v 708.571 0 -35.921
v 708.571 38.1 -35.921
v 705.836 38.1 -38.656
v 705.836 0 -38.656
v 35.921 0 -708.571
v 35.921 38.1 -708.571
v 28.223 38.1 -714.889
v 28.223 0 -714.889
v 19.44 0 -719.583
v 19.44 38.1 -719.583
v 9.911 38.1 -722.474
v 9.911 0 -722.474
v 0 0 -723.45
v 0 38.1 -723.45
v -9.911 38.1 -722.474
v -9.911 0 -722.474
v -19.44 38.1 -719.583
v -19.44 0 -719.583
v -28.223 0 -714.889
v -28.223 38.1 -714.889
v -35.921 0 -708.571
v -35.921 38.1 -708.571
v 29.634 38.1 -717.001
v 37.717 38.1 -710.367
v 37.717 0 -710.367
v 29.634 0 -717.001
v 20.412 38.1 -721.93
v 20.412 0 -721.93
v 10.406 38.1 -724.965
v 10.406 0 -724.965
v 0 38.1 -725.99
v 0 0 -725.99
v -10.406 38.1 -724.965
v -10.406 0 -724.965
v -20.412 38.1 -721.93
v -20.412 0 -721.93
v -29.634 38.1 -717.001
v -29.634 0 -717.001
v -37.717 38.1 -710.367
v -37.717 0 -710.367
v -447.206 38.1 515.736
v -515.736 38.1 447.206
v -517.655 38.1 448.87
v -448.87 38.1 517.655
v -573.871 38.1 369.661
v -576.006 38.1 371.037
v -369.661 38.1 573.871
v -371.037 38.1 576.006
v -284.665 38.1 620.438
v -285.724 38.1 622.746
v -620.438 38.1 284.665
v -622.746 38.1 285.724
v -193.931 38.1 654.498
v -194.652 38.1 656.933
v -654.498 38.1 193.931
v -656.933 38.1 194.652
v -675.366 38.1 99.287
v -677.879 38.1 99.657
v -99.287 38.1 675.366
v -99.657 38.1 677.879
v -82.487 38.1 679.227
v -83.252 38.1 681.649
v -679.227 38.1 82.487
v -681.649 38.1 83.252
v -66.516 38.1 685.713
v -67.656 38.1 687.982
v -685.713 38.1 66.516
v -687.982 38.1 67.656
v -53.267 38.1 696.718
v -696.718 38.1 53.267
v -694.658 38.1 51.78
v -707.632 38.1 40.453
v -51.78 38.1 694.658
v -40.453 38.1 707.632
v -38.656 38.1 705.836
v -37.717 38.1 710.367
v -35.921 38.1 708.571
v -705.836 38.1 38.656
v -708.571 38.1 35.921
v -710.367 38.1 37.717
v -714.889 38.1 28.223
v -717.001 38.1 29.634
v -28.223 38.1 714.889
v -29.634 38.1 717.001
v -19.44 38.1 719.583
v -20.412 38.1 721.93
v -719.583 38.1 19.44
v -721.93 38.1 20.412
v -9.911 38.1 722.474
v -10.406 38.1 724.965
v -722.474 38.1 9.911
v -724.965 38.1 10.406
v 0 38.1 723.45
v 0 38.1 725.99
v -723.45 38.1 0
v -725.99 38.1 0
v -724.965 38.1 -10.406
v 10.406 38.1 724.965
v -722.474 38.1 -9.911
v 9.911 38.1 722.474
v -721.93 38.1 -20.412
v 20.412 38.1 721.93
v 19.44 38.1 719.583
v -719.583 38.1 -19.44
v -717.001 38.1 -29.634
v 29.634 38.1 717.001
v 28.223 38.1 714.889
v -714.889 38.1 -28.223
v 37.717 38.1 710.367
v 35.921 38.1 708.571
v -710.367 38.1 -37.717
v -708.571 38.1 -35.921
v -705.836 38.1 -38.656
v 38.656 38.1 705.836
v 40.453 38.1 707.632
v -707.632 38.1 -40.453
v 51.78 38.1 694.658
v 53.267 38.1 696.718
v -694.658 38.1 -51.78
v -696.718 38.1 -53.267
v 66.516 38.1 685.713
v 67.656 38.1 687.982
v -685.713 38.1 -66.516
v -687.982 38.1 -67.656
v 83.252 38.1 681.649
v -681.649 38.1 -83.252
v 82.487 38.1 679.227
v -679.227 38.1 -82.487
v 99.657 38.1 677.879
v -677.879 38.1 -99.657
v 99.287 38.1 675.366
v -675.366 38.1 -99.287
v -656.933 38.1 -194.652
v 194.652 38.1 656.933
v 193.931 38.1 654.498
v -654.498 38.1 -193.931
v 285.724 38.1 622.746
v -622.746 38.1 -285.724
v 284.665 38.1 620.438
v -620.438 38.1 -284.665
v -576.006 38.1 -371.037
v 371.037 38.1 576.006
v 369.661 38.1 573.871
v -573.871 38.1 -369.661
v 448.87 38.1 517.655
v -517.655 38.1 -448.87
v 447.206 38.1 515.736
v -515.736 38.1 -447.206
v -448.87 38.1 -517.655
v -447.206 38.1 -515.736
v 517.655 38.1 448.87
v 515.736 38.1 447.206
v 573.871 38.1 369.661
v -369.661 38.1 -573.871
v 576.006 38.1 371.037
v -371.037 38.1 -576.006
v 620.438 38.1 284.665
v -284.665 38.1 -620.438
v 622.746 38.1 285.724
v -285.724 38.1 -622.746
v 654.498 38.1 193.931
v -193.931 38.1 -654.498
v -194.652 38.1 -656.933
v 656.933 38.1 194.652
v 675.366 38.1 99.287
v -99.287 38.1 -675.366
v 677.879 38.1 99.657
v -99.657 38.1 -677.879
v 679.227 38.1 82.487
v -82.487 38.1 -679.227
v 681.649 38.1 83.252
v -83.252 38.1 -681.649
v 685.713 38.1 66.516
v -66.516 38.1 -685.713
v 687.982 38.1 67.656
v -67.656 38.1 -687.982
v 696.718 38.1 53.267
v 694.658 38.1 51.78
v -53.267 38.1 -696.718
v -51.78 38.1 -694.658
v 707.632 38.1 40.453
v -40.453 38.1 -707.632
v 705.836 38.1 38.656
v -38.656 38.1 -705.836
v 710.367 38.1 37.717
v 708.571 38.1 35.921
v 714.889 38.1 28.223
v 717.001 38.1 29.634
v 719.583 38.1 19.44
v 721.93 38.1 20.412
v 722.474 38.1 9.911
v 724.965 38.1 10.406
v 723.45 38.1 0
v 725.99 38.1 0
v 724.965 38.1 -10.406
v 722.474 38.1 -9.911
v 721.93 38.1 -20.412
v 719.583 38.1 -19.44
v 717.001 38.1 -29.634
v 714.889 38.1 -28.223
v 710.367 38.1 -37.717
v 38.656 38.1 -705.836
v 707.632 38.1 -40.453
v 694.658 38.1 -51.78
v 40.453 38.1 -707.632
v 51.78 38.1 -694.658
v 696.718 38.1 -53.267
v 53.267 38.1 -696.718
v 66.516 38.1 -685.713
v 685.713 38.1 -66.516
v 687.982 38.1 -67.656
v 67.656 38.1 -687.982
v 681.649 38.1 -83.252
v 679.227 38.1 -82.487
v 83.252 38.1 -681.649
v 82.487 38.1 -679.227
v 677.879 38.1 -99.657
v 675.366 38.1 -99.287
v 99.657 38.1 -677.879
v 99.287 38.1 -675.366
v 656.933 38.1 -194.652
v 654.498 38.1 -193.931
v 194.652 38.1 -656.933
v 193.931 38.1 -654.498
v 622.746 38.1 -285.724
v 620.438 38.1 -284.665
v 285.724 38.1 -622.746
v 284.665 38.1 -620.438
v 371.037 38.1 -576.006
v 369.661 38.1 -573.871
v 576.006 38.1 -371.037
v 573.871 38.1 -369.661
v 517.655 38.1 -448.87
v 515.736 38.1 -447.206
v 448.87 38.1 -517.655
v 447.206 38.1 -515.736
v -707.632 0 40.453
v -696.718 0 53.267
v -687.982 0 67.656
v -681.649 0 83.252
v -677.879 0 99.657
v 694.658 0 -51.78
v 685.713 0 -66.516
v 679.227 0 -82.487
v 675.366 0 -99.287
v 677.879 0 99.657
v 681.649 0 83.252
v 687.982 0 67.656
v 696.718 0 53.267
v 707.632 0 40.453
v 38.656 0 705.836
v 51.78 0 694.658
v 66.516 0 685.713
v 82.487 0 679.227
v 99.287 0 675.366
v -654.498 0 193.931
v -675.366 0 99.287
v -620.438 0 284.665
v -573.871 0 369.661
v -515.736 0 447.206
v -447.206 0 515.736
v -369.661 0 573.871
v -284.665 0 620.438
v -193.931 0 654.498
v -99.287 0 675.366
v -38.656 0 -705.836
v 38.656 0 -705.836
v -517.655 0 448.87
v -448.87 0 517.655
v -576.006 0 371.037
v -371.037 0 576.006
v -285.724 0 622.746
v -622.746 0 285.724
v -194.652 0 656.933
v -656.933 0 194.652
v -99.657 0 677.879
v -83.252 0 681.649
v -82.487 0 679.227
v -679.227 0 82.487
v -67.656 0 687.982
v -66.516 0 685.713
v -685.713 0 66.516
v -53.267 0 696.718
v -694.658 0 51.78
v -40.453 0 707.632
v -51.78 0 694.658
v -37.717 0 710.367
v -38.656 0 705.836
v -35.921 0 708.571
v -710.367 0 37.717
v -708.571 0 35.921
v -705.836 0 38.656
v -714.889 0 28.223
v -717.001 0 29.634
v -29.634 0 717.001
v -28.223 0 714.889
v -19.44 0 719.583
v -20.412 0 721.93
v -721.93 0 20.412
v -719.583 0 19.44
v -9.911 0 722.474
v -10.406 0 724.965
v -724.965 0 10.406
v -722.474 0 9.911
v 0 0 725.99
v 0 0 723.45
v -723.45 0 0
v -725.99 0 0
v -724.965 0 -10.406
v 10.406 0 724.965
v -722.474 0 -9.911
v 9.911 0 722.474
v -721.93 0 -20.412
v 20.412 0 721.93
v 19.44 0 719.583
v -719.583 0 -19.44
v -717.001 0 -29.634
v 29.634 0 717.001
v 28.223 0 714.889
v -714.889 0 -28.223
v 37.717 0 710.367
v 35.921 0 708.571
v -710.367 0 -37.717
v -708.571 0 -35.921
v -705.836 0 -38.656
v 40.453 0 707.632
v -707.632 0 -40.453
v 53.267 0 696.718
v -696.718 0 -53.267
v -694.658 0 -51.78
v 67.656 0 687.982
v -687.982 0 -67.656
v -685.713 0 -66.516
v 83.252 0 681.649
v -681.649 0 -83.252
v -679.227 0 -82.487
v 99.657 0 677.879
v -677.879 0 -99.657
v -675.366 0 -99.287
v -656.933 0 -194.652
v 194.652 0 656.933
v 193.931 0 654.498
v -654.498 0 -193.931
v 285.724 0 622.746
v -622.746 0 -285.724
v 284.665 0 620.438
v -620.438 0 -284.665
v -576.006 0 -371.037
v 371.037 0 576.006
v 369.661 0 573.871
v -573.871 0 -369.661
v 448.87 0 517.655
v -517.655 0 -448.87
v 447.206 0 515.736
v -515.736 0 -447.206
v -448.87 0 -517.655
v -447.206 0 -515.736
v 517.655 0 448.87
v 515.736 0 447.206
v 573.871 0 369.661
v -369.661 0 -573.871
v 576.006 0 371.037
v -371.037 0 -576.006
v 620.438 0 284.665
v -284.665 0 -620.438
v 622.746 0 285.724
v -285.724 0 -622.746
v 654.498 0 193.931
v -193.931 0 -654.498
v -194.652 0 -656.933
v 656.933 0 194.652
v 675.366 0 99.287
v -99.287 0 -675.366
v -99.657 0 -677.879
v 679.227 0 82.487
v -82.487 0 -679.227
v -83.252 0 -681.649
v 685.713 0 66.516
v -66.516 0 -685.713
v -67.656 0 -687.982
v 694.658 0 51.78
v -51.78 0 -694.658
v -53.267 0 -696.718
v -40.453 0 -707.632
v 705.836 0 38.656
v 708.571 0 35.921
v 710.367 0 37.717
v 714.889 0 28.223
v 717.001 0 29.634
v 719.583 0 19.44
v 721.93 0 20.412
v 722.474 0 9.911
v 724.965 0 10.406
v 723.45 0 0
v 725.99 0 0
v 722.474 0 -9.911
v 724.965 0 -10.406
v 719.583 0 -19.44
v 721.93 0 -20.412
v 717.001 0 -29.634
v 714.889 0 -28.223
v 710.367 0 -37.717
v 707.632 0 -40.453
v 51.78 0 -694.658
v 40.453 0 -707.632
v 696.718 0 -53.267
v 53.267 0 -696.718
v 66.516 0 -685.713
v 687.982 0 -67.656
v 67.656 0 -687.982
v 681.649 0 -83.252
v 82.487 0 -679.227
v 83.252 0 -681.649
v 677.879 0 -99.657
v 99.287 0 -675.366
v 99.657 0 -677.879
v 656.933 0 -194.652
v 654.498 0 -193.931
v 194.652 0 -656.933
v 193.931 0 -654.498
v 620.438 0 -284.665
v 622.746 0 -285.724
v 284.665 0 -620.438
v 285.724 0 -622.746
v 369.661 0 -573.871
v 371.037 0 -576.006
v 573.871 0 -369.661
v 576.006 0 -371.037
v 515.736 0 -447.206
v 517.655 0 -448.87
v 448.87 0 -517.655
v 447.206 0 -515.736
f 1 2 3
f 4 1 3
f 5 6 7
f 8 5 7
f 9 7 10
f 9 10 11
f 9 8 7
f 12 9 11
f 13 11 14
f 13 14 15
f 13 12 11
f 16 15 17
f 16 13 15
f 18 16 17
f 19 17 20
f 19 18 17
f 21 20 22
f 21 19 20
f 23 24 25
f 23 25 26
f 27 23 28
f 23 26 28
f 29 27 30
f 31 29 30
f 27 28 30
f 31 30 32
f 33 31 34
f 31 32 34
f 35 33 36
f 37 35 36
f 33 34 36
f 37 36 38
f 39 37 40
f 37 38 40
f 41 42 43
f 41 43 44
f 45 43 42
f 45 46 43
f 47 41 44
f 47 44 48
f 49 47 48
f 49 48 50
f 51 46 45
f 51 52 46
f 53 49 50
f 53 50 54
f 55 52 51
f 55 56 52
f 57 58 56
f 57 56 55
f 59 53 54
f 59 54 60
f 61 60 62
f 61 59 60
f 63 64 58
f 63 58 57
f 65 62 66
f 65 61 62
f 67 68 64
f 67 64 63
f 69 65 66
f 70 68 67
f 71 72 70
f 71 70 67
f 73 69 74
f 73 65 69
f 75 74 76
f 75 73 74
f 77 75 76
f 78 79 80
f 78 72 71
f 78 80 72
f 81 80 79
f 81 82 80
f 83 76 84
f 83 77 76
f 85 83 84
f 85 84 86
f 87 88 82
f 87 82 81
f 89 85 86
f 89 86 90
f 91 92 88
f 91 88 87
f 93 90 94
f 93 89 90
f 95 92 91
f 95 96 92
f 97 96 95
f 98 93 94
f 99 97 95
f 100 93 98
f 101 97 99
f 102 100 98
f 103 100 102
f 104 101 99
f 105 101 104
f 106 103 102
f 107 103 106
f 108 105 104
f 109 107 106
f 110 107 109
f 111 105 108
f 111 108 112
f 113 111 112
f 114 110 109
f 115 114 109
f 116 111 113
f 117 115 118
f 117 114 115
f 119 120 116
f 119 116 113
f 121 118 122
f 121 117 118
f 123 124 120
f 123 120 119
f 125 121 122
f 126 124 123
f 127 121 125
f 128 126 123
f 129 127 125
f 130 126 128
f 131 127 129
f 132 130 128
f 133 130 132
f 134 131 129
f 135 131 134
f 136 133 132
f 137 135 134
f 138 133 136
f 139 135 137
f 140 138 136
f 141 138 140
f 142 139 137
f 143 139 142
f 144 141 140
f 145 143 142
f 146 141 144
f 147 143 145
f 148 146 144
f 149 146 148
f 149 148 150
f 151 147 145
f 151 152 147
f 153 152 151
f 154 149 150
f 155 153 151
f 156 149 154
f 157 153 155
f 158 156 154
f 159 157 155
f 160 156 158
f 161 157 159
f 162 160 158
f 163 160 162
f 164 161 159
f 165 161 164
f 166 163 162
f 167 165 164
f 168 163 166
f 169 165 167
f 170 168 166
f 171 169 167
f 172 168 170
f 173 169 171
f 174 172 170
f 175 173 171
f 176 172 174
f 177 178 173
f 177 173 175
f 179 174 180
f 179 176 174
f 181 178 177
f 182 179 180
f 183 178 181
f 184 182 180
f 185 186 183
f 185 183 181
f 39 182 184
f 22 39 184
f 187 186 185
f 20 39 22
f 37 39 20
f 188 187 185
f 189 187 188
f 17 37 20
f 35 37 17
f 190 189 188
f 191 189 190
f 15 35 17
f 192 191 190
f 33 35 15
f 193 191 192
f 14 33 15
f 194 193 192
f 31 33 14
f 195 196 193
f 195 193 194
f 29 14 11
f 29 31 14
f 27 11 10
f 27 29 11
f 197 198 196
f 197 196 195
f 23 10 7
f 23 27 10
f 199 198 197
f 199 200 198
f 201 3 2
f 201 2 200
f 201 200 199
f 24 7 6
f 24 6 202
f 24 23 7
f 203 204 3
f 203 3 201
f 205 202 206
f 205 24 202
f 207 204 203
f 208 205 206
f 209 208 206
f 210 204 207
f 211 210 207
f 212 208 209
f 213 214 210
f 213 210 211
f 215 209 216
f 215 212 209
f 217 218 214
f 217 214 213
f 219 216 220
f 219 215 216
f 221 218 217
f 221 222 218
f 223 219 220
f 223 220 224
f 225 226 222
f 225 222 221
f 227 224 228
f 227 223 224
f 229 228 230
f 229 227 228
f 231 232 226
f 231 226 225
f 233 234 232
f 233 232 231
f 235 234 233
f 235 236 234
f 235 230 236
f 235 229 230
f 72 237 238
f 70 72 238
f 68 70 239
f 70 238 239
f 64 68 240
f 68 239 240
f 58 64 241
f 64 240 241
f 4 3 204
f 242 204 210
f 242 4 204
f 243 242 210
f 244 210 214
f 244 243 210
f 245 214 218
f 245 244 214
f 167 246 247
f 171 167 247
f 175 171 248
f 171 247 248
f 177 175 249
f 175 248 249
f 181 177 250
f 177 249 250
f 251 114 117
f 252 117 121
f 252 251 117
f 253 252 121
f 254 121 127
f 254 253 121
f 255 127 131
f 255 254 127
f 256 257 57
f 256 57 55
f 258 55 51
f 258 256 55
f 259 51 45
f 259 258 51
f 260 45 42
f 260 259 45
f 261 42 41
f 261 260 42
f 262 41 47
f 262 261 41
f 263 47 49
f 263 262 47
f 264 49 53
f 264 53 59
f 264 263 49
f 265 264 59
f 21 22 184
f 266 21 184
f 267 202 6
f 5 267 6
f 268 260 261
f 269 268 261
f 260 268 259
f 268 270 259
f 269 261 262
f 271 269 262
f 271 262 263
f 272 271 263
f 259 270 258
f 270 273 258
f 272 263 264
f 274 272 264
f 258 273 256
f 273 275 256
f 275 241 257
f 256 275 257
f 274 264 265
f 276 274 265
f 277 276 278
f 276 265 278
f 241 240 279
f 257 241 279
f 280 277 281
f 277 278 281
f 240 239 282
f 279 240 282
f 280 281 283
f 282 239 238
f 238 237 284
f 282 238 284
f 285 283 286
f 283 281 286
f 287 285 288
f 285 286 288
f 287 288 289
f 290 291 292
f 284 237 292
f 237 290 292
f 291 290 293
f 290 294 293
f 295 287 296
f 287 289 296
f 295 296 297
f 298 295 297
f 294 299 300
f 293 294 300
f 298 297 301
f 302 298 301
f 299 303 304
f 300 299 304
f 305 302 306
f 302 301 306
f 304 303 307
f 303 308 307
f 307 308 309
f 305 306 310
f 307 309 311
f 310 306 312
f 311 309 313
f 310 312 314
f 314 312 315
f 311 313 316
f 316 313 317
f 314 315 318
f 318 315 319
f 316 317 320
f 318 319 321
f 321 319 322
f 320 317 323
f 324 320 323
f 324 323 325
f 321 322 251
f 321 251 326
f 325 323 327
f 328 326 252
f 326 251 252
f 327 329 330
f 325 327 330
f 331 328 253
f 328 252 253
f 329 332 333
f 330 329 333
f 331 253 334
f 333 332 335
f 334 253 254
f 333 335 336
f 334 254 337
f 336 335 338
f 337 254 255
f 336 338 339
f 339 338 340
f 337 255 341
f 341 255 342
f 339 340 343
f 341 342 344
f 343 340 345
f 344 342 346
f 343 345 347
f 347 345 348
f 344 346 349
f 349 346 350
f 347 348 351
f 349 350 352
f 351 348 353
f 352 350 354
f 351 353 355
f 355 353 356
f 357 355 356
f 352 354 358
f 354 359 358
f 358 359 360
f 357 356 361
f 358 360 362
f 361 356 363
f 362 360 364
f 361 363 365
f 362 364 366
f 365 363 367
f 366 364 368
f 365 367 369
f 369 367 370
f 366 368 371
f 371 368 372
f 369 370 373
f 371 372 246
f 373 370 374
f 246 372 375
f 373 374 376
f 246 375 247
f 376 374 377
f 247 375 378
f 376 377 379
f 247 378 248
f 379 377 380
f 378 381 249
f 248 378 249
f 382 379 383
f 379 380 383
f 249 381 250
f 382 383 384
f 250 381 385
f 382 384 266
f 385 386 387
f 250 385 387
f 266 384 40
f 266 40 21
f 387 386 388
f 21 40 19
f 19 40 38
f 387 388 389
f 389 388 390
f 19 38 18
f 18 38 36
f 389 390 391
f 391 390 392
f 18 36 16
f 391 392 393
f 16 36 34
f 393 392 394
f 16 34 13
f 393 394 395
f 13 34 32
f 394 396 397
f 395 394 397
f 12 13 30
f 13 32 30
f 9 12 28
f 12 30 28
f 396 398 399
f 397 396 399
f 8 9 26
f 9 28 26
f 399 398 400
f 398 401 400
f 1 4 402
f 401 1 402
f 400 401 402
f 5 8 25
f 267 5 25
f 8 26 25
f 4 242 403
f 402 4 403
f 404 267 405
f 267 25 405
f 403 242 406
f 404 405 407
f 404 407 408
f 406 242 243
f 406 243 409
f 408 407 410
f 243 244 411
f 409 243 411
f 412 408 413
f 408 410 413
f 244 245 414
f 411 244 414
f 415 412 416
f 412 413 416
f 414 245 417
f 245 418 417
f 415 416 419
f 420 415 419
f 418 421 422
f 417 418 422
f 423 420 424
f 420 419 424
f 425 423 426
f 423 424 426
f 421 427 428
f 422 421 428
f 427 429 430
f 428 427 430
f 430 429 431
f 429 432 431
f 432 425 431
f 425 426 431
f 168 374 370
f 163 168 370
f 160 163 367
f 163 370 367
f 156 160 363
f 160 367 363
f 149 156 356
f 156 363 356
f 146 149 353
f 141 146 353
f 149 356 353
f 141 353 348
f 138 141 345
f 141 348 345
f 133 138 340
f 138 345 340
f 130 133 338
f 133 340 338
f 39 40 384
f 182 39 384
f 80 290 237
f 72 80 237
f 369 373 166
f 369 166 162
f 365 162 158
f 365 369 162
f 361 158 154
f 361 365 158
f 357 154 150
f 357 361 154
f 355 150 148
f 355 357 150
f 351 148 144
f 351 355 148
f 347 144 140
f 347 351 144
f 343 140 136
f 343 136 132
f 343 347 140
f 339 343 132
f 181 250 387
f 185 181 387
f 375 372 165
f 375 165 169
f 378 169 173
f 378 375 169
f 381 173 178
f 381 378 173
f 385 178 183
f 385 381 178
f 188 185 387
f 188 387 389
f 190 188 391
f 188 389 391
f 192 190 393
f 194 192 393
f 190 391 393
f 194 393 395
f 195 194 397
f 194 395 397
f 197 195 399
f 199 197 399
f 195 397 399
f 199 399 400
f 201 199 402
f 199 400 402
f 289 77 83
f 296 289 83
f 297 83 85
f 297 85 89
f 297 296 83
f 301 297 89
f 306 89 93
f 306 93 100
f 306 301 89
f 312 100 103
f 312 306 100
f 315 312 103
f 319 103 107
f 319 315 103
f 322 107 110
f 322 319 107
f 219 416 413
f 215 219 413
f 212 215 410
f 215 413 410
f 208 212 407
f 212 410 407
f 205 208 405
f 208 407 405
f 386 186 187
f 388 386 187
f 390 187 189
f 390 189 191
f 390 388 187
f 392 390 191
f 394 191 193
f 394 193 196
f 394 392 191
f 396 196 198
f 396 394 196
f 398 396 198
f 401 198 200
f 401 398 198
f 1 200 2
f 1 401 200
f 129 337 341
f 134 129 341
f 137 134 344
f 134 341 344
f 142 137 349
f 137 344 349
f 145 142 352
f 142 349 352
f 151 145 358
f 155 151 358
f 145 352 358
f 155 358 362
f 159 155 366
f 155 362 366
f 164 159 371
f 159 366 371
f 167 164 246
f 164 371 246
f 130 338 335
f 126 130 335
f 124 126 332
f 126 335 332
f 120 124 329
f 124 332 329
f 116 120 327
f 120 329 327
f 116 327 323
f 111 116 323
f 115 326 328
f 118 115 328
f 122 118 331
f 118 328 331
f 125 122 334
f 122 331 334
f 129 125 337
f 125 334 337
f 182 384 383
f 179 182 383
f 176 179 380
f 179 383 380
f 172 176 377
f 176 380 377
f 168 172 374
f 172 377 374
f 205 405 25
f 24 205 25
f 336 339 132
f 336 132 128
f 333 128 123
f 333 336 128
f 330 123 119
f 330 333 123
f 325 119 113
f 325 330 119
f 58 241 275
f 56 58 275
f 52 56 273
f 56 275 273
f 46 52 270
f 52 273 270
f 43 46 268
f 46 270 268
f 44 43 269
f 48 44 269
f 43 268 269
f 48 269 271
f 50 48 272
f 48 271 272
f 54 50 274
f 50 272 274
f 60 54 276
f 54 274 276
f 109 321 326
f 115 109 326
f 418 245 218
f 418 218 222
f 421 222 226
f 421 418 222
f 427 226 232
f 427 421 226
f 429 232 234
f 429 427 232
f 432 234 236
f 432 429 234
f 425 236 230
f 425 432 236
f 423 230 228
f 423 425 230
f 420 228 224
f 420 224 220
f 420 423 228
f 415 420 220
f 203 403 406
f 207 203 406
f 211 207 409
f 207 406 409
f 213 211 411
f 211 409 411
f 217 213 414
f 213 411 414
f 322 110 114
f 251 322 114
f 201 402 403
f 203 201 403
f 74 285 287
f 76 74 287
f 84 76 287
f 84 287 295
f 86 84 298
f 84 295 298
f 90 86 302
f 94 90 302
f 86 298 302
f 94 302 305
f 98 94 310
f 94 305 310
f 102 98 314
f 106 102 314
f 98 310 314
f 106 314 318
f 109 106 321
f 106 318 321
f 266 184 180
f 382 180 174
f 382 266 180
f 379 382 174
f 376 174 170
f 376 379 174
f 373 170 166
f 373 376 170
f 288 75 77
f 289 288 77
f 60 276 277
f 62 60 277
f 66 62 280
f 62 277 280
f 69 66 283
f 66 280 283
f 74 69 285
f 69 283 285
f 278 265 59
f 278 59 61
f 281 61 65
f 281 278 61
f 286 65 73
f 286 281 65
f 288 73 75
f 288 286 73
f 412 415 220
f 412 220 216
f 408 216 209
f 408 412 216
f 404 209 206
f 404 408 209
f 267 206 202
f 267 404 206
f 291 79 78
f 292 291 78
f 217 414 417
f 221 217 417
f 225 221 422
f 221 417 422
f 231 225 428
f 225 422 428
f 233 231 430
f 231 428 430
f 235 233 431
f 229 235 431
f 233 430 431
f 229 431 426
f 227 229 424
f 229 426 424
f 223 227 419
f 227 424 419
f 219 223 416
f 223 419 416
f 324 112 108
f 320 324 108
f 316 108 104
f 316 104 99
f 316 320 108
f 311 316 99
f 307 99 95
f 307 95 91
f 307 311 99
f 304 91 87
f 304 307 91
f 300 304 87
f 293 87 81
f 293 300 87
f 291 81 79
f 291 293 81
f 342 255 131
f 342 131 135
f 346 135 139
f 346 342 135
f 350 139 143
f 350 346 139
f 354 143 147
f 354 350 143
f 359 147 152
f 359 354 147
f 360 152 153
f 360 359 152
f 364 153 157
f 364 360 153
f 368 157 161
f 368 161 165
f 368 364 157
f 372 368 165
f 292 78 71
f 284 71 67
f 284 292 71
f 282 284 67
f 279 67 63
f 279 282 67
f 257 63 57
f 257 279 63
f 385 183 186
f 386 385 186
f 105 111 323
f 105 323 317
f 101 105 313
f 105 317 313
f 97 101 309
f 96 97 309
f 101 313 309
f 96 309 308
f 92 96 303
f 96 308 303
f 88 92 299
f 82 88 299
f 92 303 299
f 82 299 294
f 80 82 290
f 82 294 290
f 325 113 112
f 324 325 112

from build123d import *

# Parameters (mm, degrees)
EXTRUDE_THIN1_DEPTH = 38.1


with BuildPart() as part:
    # Sketch1 → Extrude-Thin1 (new body)
    with BuildSketch(Plane(origin=(0, 0, 0), x_dir=(1, 0, 0), z_dir=(0, 1, 0))):
        with BuildLine():
            Line((40.452514176, 707.631658817), (37.717075708, 710.367097284))
            ThreePointArc((37.717075708, 710.367097284), (0, 725.990021576), (-37.717075708, 710.367097284))
            Line((-37.717075708, 710.367097284), (-40.452514176, 707.631658817))
            ThreePointArc((-40.452514176, 707.631658817), (-67.656084524, 687.982343635), (-99.656821316, 677.878746672))
            ThreePointArc((-99.656821316, 677.878746672), (-484.484817732, 484.484817732), (-677.878746672, 99.656821316))
            ThreePointArc((-677.878746672, 99.656821316), (-687.982343635, 67.656084524), (-707.631658817, 40.452514176))
            Line((-707.631658817, 40.452514176), (-710.367097284, 37.717075708))
            ThreePointArc((-710.367097284, 37.717075708), (-725.990021576, 0), (-710.367097284, -37.717075708))
            Line((-710.367097284, -37.717075708), (-707.631658817, -40.452514176))
            ThreePointArc((-707.631658817, -40.452514176), (-687.982343635, -67.656084524), (-677.878746672, -99.656821316))
            ThreePointArc((-677.878746672, -99.656821316), (-484.484817732, -484.484817732), (-99.656821316, -677.878746672))
            ThreePointArc((-99.656821316, -677.878746672), (-67.656084524, -687.982343635), (-40.452514176, -707.631658817))
            Line((-40.452514176, -707.631658817), (-37.717075708, -710.367097284))
            ThreePointArc((-37.717075708, -710.367097284), (0, -725.990021576), (37.717075708, -710.367097284))
            Line((37.717075708, -710.367097284), (40.452514176, -707.631658817))
            ThreePointArc((40.452514176, -707.631658817), (67.656084524, -687.982343635), (99.656821316, -677.878746672))
            ThreePointArc((99.656821316, -677.878746672), (484.484817732, -484.484817732), (677.878746672, -99.656821316))
            ThreePointArc((677.878746672, -99.656821316), (687.982343635, -67.656084524), (707.631658817, -40.452514176))
            Line((707.631658817, -40.452514176), (710.367097284, -37.717075708))
            ThreePointArc((710.367097284, -37.717075708), (725.990021576, 0), (710.367097284, 37.717075708))
            Line((710.367097284, 37.717075708), (707.631658817, 40.452514176))
            ThreePointArc((707.631658817, 40.452514176), (687.982343635, 67.656084524), (677.878746672, 99.656821316))
            ThreePointArc((677.878746672, 99.656821316), (484.484817732, 484.484817732), (99.656821316, 677.878746672))
            ThreePointArc((99.656821316, 677.878746672), (67.656084524, 687.982343635), (40.452514176, 707.631658817))
        make_face()
        with BuildLine():
            Line((38.656462951, 705.835607593), (35.921024484, 708.57104606))
            ThreePointArc((35.921024484, 708.57104606), (0, 723.450021576), (-35.921024484, 708.57104606))
            Line((-35.921024484, 708.57104606), (-38.656462951, 705.835607593))
            ThreePointArc((-38.656462951, 705.835607593), (-66.515541019, 685.712814936), (-99.287379903, 675.365757806))
            ThreePointArc((-99.287379903, 675.365757806), (-482.688766507, 482.688766507), (-675.365757806, 99.287379903))
            ThreePointArc((-675.365757806, 99.287379903), (-685.712814936, 66.515541019), (-705.835607593, 38.656462951))
            Line((-705.835607593, 38.656462951), (-708.57104606, 35.921024484))
            ThreePointArc((-708.57104606, 35.921024484), (-723.450021576, 0), (-708.57104606, -35.921024484))
            Line((-708.57104606, -35.921024484), (-705.835607593, -38.656462951))
            ThreePointArc((-705.835607593, -38.656462951), (-685.712814936, -66.515541019), (-675.365757806, -99.287379903))
            ThreePointArc((-675.365757806, -99.287379903), (-482.688766507, -482.688766507), (-99.287379903, -675.365757806))
            ThreePointArc((-99.287379903, -675.365757806), (-66.515541019, -685.712814936), (-38.656462951, -705.835607593))
            Line((-38.656462951, -705.835607593), (-35.921024484, -708.57104606))
            ThreePointArc((-35.921024484, -708.57104606), (0, -723.450021576), (35.921024484, -708.57104606))
            Line((35.921024484, -708.57104606), (38.656462951, -705.835607593))
            ThreePointArc((38.656462951, -705.835607593), (66.515541019, -685.712814936), (99.287379903, -675.365757806))
            ThreePointArc((99.287379903, -675.365757806), (482.688766507, -482.688766507), (675.365757806, -99.287379903))
            ThreePointArc((675.365757806, -99.287379903), (685.712814936, -66.515541019), (705.835607593, -38.656462951))
            Line((705.835607593, -38.656462951), (708.57104606, -35.921024484))
            ThreePointArc((708.57104606, -35.921024484), (723.450021576, 0), (708.57104606, 35.921024484))
            Line((708.57104606, 35.921024484), (705.835607593, 38.656462951))
            ThreePointArc((705.835607593, 38.656462951), (685.712814936, 66.515541019), (675.365757806, 99.287379903))
            ThreePointArc((675.365757806, 99.287379903), (482.688766507, 482.688766507), (99.287379903, 675.365757806))
            ThreePointArc((99.287379903, 675.365757806), (66.515541019, 685.712814936), (38.656462951, 705.835607593))
        make_face(mode=Mode.SUBTRACT)
    extrude(amount=EXTRUDE_THIN1_DEPTH)


solid = part.part
